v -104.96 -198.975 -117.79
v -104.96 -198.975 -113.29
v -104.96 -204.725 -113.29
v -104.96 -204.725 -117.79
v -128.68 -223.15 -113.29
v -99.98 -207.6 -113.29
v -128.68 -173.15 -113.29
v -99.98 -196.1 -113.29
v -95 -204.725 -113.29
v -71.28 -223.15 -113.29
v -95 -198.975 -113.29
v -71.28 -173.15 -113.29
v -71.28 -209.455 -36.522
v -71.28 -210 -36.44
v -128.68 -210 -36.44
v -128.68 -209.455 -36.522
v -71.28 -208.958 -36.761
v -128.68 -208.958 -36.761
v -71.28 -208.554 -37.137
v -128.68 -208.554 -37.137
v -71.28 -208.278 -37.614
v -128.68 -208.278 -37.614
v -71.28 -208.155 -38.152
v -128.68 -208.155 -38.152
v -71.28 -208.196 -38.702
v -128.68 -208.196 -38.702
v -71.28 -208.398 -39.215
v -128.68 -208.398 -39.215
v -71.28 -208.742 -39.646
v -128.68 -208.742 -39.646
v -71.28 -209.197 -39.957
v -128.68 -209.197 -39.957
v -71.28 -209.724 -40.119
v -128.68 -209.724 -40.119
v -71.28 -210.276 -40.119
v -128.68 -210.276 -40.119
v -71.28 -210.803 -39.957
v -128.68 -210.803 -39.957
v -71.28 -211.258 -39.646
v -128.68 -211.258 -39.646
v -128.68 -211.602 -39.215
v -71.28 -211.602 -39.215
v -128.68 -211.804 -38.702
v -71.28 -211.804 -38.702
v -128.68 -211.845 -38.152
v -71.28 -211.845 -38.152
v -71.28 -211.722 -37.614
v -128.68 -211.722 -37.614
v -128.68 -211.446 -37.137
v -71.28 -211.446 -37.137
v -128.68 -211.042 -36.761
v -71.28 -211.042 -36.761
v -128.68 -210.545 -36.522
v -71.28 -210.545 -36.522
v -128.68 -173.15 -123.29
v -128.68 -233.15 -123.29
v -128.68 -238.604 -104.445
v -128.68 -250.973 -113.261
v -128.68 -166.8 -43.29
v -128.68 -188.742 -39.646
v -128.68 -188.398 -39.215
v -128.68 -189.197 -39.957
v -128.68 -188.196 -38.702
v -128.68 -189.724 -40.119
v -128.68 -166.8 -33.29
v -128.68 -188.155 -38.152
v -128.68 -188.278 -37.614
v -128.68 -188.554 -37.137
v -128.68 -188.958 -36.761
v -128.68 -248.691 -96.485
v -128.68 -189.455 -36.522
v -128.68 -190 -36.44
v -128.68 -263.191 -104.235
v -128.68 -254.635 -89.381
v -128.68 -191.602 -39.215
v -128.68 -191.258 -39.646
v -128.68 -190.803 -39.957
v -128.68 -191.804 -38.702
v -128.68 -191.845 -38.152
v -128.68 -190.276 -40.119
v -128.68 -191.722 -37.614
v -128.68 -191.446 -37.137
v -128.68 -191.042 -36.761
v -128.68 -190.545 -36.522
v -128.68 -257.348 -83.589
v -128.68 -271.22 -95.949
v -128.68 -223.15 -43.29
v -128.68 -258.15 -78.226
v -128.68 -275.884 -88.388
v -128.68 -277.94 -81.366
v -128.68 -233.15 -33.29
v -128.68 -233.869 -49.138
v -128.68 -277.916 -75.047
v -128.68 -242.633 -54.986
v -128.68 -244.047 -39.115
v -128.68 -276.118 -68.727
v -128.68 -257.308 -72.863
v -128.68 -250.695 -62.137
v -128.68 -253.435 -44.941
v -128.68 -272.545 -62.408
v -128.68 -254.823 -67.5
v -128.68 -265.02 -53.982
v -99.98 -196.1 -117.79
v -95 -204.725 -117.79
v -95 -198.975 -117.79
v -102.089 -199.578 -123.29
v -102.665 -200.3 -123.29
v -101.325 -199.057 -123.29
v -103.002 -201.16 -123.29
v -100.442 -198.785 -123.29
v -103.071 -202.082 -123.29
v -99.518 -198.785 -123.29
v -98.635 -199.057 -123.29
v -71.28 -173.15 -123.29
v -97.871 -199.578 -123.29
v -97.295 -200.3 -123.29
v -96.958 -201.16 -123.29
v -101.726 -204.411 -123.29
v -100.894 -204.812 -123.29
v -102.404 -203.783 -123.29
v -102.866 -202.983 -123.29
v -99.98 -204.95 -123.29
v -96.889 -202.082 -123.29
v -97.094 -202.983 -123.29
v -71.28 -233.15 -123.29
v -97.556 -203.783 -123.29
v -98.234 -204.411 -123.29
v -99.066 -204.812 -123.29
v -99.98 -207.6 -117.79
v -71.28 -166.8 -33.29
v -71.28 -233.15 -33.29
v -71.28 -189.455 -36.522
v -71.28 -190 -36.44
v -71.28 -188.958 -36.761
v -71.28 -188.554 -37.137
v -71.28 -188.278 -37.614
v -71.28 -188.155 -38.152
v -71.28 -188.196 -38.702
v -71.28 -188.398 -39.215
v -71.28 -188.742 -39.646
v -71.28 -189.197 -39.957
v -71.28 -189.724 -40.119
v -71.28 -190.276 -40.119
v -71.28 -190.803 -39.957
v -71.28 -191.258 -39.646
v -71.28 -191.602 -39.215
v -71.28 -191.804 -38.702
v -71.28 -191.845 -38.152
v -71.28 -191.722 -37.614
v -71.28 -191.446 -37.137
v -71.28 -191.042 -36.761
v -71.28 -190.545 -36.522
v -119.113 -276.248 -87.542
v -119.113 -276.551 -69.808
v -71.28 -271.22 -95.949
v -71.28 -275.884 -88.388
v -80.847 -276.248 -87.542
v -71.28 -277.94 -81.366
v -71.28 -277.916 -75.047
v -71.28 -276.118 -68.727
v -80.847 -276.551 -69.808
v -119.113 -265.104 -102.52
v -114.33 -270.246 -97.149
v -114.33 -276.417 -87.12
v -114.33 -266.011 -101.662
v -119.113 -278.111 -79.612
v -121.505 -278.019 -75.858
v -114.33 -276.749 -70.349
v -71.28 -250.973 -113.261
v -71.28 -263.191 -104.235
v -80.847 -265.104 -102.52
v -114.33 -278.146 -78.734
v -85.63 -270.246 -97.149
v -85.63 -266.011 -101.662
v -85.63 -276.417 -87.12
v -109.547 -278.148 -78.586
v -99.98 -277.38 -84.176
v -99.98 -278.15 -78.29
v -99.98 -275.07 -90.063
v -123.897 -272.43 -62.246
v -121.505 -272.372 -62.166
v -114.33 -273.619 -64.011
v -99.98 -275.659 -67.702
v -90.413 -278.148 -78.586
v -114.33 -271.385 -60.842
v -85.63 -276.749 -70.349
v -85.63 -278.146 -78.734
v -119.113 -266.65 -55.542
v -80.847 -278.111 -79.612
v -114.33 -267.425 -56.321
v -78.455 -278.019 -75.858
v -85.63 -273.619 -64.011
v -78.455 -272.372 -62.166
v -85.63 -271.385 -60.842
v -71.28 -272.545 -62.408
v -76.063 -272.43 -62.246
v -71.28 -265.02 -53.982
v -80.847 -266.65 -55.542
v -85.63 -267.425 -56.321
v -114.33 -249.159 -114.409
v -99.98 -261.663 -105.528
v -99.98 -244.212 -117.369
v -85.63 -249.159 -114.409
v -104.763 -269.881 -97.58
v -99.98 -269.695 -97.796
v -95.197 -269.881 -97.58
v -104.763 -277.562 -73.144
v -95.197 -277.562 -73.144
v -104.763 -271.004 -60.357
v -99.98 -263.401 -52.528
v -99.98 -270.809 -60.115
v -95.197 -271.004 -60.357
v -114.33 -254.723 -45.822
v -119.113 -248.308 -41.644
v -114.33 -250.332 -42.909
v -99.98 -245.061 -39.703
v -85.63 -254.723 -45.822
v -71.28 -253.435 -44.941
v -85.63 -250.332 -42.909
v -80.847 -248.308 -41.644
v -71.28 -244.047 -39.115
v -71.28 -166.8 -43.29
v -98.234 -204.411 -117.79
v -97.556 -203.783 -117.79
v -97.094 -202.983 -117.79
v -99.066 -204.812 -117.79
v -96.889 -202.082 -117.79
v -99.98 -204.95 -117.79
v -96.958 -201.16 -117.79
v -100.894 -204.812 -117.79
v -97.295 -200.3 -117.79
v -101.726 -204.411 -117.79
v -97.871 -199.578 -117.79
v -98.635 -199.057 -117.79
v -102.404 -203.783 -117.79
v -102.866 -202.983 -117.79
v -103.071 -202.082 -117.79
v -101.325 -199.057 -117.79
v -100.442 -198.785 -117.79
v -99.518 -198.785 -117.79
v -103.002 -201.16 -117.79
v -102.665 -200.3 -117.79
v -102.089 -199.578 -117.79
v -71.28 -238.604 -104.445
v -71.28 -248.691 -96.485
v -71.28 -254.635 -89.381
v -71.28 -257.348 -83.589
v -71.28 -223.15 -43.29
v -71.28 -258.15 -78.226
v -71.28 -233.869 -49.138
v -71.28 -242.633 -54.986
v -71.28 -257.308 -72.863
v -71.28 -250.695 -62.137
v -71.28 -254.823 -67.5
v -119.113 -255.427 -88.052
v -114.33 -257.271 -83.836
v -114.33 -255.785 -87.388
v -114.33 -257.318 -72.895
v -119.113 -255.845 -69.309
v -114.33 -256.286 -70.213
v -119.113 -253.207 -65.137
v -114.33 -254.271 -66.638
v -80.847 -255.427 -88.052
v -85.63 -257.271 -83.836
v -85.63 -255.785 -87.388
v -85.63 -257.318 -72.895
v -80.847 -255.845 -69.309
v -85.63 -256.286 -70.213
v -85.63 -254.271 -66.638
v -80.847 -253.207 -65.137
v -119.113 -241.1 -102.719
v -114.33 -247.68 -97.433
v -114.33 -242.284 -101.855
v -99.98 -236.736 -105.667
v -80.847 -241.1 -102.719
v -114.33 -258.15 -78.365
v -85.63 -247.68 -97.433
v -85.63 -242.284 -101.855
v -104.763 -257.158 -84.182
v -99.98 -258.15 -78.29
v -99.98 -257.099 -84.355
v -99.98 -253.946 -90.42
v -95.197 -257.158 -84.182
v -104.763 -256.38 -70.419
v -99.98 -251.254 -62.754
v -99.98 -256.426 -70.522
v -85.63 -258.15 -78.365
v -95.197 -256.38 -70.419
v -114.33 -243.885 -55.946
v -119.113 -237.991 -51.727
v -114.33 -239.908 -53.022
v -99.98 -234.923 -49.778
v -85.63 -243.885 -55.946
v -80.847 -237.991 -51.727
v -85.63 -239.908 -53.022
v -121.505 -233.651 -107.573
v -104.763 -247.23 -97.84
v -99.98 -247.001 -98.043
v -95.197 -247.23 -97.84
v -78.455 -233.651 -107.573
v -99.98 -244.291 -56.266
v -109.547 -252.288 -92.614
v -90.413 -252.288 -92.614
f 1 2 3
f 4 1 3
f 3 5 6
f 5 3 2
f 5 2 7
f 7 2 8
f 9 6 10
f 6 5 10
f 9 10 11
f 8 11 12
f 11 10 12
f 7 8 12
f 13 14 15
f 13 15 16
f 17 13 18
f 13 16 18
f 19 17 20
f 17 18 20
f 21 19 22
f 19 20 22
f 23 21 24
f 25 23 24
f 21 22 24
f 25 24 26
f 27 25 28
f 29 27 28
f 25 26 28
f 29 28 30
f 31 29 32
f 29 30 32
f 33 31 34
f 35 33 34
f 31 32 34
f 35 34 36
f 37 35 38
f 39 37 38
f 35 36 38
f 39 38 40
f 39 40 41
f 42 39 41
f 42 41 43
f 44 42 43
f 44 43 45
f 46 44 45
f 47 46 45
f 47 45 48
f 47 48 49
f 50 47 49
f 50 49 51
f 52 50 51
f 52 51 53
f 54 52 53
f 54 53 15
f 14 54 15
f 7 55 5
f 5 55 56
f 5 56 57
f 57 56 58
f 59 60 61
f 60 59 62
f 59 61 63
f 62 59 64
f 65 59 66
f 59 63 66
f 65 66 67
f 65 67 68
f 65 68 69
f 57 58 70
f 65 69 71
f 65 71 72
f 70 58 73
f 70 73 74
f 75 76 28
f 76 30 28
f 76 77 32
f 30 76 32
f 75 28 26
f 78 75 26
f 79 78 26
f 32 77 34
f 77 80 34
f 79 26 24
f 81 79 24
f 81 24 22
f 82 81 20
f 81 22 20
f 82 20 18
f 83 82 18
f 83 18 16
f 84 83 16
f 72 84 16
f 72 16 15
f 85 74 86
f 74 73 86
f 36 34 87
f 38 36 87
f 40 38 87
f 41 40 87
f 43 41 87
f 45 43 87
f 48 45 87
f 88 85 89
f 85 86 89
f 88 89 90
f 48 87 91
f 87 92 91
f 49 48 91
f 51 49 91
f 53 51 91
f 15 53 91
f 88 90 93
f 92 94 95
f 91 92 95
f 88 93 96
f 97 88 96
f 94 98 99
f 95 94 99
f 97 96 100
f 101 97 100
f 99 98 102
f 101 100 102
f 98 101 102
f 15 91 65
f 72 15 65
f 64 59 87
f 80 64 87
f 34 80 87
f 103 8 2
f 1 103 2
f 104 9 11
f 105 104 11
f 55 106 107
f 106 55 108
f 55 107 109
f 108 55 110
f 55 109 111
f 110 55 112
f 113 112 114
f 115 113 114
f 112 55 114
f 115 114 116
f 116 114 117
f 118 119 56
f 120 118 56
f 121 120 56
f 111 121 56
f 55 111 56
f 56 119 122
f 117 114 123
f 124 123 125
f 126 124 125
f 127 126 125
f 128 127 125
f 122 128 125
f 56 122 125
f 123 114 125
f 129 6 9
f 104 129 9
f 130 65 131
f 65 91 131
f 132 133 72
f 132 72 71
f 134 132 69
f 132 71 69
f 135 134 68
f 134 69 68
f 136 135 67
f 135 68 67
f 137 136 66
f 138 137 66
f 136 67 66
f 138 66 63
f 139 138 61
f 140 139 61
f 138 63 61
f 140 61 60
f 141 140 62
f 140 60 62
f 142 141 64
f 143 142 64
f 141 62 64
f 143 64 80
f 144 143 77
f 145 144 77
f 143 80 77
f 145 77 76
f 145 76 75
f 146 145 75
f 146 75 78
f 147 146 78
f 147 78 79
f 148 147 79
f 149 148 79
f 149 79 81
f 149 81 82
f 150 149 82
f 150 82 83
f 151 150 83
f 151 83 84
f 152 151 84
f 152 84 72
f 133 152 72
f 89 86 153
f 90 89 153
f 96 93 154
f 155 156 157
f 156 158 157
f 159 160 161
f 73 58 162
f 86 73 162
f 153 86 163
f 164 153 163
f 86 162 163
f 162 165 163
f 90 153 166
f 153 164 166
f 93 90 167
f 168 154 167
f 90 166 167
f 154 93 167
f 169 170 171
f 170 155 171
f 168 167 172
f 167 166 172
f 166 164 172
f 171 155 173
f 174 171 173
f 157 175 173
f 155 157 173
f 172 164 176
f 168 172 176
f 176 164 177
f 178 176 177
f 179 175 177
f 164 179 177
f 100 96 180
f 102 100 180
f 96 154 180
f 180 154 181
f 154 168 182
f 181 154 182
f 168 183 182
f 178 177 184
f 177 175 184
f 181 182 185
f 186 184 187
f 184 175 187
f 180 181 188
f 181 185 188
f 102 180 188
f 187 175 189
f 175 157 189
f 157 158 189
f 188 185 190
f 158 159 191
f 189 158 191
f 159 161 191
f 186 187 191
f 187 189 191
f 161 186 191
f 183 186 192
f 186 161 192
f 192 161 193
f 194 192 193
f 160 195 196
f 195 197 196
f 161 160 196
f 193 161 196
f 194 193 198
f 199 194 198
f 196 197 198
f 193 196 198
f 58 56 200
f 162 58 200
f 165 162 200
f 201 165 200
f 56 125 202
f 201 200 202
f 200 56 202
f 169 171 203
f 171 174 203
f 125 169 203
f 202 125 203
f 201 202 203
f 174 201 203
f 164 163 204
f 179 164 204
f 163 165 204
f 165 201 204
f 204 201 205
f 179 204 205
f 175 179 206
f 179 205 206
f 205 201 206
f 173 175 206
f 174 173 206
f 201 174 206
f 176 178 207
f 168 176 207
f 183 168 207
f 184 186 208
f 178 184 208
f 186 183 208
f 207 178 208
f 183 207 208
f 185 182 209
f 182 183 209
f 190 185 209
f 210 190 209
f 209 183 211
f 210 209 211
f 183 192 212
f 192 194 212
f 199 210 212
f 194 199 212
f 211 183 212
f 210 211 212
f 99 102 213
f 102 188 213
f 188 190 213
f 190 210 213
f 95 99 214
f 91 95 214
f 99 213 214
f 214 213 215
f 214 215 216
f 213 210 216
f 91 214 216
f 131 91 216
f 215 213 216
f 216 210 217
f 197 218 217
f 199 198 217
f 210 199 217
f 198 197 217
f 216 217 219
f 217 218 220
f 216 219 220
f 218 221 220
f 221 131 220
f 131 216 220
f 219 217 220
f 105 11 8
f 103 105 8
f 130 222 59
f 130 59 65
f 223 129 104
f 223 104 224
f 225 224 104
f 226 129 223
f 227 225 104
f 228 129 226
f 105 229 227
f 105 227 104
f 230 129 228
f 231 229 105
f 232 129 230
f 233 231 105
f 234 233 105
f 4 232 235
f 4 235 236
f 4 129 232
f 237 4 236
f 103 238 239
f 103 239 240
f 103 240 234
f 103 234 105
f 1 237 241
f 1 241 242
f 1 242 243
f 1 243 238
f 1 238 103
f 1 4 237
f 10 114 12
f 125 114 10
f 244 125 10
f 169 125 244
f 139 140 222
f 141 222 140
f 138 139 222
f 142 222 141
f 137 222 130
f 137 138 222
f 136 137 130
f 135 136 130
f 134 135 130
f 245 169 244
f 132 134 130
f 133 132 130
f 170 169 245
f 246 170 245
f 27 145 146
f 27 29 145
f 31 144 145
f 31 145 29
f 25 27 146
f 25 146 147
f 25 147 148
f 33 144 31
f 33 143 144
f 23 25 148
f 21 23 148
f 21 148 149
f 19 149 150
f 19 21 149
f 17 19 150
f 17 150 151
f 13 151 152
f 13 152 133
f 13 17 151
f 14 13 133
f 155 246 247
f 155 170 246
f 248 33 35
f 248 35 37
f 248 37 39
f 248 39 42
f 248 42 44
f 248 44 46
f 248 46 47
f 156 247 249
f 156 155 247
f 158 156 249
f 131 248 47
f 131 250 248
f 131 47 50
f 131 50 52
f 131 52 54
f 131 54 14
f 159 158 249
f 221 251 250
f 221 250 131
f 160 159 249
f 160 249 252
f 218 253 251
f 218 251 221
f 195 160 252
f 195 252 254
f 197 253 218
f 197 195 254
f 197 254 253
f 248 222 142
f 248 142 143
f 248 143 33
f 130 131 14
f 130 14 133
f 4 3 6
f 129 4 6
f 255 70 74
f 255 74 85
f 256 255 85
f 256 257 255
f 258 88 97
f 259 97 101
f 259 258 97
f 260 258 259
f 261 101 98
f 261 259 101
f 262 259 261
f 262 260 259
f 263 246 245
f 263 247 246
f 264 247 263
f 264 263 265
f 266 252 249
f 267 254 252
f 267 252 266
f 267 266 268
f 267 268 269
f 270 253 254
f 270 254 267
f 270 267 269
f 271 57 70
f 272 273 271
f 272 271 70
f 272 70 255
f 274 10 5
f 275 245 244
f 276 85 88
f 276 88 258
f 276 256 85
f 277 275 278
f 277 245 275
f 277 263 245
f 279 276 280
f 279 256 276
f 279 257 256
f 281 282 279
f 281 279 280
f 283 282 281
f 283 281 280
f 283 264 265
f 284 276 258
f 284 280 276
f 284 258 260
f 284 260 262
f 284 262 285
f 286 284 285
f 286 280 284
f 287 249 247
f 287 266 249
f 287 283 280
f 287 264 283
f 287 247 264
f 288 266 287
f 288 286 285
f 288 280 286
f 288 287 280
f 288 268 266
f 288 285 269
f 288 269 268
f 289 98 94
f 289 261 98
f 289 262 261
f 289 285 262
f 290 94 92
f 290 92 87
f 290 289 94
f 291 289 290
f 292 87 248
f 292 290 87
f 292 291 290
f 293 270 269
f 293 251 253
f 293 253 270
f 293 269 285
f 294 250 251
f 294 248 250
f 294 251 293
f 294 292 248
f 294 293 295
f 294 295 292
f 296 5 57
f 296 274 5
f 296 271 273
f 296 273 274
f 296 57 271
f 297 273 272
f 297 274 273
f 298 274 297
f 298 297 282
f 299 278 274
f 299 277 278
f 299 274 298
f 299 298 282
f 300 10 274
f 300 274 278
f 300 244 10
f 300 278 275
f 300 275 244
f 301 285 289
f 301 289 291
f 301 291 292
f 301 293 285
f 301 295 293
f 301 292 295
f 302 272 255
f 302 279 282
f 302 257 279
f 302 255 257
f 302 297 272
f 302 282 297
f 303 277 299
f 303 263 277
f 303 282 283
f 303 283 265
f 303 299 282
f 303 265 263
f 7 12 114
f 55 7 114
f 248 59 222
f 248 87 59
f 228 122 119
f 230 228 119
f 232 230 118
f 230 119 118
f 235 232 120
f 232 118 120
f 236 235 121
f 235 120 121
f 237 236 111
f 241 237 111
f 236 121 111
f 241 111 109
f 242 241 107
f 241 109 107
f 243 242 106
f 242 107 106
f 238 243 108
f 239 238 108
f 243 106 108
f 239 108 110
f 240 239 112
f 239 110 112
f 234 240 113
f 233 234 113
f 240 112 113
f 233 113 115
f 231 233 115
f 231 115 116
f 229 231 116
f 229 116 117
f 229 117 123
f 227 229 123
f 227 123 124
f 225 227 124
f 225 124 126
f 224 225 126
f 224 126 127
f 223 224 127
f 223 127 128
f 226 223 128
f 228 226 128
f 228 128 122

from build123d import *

# Parameters (mm, degrees)
PAD066_DEPTH            = 57.4
POCKET083_DEPTH         = 4.5
SKETCH144_R             = 3.1
POCKET097_DEPTH         = 10
POCKET097_FACE16_W      = 10
POCKET097_FACE16_H      = 57.4
PAD073_DEPTH            = 6.35
SKETCH147_R             = 1.85
POCKET099_DEPTH         = 57.401
BODY017_PLACEMENT_ANGLE = 270


with BuildPart() as part:
    # Sketch126 → Pad066 (new body)
    with BuildSketch(Plane.XY):
        with BuildLine():
            Line((10, 10), (10, 60))
            Line((10, 60), (0, 60))
            Line((0, 60), (0, 0))
            add(Edge.make_bspline(
                [(0, 0), (45, -90), (90, 0)],
                knots=[0, 0, 0, 1, 1, 1], degree=2))
            Line((90, 0), (90, 60))
            Line((90, 60), (80, 60))
            Line((80, 60), (80, 10))
            add(Edge.make_bspline(
                [(10, 10), (45, -60), (80, 10)],
                knots=[0, 0, 0, 1, 1, 1], degree=2))
        make_face()
    extrude(amount=PAD066_DEPTH)

    # Sketch127 (on Face1 of Pad066) → Pocket083 (cut)
    with BuildSketch(Plane.YZ.offset(10)):
        Polygon((28.425, 33.679646), (25.55, 28.7), (28.425, 23.720354), (34.175, 23.720354), (37.05, 28.7), (34.175, 33.679646), align=None)
    extrude(amount=-POCKET083_DEPTH, mode=Mode.SUBTRACT)

    # Sketch144 (on Face13 of Pocket083) → Pocket097 (cut)
    with BuildSketch(Plane(origin=(0, 0, 0), x_dir=(0, -1, 0), z_dir=(-1, 0, 0))):
        with Locations((-31.3, 28.7)):
            Circle(SKETCH144_R)
    extrude(amount=-POCKET097_DEPTH, mode=Mode.SUBTRACT)

    # Pocket097 Face16 → Pad073 (add)
    with BuildSketch(Plane(origin=(85, 60, 28.7), x_dir=(1, 0, 0), z_dir=(0, 1, 0))):
        Rectangle(POCKET097_FACE16_W, POCKET097_FACE16_H)
    extrude(amount=PAD073_DEPTH)

    # Sketch147 (on Face16 of Pad073) → Pocket099 (cut, through all)
    with BuildSketch(Plane.XY.offset(57.4)):
        with Locations((85, 43.15)):
            Circle(SKETCH147_R)
        with Locations((85, 23.15)):
            Circle(SKETCH147_R)
    extrude(amount=-POCKET099_DEPTH, mode=Mode.SUBTRACT)


with BuildPart() as part_1:
    # Body017 placement: moved
    add(part.part.moved(Location((-71.28, -233.15, -123.29))).rotate(Axis((-71.28, -233.15, -123.29), (0, 1, 0)), BODY017_PLACEMENT_ANGLE))


solid = part_1.part
